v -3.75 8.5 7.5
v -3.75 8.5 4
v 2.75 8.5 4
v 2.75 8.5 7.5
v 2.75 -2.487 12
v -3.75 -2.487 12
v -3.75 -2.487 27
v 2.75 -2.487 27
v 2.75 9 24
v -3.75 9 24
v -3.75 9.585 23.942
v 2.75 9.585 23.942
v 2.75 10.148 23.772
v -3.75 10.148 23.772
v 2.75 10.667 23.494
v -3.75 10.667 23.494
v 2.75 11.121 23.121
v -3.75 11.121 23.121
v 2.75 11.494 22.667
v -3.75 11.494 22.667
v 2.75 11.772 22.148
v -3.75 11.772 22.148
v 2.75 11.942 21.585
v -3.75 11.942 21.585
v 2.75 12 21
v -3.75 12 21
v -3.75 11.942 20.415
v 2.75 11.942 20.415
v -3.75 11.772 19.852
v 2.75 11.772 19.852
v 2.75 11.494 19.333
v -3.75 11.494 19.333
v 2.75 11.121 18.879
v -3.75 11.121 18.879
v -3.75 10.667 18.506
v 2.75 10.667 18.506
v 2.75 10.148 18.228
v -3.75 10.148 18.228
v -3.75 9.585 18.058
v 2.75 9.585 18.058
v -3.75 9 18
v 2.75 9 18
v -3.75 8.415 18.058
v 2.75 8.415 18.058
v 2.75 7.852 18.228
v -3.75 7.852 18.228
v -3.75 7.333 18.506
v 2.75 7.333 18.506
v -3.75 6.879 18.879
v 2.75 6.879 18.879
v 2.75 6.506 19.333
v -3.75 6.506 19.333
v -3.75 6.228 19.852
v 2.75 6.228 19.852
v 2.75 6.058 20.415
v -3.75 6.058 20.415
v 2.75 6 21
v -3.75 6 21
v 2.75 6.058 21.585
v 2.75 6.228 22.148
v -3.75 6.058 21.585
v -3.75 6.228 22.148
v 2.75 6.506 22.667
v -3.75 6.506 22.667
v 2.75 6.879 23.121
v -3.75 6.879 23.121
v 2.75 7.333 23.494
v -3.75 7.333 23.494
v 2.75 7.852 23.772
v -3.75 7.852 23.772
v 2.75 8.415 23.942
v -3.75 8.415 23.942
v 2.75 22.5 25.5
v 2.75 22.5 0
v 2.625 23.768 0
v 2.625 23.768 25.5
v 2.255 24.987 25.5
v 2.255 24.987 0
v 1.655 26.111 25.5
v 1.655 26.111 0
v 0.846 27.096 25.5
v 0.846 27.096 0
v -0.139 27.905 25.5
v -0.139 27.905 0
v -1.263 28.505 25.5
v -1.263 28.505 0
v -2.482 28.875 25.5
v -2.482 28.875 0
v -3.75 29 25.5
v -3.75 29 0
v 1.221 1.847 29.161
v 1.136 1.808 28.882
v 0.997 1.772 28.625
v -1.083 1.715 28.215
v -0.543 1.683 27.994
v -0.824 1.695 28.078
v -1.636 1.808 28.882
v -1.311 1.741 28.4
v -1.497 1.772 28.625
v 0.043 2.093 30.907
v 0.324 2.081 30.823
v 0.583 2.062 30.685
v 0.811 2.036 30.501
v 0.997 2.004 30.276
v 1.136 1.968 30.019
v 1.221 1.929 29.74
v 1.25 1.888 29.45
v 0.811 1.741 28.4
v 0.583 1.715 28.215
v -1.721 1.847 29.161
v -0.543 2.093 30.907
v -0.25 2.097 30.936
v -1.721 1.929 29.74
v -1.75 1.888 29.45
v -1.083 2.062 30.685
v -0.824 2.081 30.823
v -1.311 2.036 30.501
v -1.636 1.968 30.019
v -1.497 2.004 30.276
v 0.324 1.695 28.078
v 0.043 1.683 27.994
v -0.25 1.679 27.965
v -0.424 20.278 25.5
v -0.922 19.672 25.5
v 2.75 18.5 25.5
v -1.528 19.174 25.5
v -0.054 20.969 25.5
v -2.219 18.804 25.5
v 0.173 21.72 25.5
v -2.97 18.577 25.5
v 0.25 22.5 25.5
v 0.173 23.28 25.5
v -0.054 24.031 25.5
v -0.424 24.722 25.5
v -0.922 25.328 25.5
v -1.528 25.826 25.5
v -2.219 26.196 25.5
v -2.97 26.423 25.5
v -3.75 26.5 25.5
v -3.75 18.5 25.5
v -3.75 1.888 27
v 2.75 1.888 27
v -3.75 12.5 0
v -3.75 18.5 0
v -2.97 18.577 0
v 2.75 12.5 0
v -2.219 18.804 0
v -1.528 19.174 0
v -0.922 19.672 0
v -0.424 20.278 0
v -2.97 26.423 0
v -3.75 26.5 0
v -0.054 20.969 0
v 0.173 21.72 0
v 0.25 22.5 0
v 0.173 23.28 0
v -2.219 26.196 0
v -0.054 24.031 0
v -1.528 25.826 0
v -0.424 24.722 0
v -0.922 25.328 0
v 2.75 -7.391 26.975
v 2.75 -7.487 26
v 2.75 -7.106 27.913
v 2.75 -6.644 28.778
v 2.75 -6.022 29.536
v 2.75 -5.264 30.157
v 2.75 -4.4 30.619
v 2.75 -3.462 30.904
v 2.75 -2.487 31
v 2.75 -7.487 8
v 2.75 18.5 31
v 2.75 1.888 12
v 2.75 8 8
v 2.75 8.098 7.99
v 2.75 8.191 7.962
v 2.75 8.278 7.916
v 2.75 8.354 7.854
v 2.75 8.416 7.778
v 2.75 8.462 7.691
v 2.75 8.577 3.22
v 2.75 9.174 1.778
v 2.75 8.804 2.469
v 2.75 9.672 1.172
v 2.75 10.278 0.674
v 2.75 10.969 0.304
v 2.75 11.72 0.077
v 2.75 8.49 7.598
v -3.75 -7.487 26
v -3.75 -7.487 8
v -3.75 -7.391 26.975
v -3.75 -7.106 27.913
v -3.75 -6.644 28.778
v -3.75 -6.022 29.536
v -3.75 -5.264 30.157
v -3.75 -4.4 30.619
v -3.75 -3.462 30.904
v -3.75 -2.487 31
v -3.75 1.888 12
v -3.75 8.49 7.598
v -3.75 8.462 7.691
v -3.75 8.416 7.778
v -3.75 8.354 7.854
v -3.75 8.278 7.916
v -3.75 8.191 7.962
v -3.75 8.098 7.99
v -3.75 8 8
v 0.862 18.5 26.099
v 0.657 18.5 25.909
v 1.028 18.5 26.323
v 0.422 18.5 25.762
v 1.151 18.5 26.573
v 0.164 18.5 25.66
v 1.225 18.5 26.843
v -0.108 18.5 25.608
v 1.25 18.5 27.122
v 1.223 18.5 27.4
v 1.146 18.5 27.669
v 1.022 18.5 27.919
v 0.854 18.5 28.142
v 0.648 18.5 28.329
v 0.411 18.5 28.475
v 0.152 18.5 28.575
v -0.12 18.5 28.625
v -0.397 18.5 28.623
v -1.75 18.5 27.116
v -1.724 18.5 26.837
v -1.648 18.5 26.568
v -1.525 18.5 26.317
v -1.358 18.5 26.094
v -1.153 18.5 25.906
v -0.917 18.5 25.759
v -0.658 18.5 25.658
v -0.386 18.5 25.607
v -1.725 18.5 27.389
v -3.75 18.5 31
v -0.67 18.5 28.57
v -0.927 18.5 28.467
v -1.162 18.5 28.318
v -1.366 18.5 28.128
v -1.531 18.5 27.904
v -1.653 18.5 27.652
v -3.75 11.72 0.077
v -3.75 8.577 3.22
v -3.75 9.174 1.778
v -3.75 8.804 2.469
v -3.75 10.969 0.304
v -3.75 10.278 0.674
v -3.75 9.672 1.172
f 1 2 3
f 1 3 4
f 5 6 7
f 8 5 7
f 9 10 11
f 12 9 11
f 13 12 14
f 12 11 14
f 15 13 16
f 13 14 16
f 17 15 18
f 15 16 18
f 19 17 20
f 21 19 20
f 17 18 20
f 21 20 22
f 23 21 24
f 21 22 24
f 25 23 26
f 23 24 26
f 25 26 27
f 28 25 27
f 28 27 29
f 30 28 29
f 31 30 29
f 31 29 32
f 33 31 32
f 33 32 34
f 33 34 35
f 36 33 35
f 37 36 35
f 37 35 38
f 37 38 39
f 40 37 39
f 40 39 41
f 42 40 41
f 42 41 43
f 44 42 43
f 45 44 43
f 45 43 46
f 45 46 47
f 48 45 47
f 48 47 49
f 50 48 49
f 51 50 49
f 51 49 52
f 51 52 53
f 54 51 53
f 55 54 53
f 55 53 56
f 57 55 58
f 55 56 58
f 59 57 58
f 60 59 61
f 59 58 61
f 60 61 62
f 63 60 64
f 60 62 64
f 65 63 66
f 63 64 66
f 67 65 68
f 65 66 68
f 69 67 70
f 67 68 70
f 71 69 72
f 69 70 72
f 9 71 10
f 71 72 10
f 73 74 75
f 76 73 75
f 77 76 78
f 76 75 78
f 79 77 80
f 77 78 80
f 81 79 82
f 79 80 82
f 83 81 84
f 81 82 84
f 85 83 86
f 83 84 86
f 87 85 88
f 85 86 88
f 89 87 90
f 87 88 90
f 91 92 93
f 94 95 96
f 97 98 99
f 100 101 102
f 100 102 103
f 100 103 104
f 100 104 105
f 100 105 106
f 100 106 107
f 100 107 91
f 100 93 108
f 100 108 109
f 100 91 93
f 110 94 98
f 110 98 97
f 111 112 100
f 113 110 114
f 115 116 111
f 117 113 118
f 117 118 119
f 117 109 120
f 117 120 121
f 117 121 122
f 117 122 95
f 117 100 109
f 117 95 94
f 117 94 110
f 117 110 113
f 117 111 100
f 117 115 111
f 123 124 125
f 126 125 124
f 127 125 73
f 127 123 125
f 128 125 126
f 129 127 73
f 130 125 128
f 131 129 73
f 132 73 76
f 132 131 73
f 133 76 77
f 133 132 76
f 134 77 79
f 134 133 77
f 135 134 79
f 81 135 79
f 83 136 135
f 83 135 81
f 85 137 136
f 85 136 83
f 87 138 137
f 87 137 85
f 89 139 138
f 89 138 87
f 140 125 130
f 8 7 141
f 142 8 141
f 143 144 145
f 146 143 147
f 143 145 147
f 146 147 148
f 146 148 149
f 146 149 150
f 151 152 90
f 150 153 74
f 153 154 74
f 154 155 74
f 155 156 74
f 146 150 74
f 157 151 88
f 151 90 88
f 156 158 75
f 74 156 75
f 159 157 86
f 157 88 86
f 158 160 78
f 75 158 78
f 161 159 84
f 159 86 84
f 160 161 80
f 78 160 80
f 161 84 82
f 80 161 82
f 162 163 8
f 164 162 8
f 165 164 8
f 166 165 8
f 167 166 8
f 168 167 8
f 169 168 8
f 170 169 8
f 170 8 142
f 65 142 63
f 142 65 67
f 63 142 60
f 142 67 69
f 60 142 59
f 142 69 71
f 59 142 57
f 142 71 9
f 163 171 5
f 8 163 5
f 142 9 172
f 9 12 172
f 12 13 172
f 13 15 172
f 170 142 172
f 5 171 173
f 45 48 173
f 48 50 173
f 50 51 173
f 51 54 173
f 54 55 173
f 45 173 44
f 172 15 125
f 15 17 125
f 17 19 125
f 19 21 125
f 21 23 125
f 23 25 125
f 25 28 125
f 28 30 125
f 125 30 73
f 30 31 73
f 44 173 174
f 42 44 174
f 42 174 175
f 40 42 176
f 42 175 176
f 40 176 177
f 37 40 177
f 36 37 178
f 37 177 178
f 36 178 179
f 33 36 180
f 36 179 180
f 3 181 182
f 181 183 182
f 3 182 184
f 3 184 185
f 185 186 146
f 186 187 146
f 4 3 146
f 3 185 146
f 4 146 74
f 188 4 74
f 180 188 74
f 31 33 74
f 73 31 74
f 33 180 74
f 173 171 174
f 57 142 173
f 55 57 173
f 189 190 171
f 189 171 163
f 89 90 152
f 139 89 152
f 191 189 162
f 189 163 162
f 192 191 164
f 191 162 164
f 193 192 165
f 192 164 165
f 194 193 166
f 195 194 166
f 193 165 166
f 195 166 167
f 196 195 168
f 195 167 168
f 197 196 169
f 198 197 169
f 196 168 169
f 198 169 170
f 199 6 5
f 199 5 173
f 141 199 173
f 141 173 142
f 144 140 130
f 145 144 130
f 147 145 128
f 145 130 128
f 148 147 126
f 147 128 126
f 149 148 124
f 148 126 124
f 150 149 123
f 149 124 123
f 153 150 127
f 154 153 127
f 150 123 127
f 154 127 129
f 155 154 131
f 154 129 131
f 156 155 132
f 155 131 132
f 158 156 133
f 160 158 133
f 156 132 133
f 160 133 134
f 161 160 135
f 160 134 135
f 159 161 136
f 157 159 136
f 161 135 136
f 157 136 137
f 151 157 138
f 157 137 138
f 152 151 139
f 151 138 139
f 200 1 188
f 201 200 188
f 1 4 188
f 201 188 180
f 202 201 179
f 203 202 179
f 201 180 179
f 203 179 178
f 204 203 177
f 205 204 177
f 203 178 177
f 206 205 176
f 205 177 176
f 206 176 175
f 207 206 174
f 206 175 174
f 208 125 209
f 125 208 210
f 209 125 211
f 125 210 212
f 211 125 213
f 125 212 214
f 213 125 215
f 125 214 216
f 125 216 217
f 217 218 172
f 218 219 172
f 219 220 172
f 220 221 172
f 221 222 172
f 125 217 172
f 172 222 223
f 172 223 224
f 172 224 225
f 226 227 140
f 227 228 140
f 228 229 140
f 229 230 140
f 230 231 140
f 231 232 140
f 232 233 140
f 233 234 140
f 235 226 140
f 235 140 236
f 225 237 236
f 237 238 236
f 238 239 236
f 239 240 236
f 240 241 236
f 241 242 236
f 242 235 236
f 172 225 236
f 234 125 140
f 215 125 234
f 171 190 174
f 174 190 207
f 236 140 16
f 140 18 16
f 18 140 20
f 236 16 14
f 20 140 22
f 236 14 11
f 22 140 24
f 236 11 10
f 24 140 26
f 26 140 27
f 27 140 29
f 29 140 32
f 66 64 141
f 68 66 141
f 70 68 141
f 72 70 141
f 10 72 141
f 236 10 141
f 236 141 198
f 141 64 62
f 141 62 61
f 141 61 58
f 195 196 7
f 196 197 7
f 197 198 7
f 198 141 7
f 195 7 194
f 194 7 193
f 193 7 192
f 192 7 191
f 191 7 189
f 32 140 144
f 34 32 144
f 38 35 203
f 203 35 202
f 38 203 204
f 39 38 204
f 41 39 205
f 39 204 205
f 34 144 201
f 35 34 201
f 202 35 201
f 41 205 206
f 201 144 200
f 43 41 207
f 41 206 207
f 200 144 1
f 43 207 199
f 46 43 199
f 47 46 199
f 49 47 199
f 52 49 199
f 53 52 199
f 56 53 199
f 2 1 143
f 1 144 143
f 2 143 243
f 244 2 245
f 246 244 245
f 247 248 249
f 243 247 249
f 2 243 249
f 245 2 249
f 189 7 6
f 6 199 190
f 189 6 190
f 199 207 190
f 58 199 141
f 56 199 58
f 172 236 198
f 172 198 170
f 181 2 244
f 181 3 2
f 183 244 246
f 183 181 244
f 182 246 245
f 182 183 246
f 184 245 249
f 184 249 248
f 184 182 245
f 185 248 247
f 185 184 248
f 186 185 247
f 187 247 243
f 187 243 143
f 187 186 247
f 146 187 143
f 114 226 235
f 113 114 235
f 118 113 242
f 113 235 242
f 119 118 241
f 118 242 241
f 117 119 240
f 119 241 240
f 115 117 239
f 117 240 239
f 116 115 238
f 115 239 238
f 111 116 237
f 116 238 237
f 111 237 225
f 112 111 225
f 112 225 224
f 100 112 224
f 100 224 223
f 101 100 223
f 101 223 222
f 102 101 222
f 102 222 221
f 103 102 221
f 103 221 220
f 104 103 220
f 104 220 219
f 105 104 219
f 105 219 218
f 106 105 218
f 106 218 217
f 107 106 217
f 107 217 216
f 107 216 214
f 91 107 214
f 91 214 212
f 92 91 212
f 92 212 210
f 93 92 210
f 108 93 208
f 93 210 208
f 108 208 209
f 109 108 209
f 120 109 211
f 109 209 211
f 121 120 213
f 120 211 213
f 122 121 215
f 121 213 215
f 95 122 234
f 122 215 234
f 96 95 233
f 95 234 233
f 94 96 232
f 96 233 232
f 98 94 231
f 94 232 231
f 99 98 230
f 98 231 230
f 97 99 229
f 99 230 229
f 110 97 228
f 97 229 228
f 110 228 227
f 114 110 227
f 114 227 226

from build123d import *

# Parameters (mm, degrees)
BOSS_EXTRUDE1_DEPTH = 31
SKETCH2_W           = 5.5
SKETCH2_H           = 10.5
CUT_EXTRUDE1_DEPTH  = 7.5
SKETCH3_R           = 3
CUT_EXTRUDE2_DEPTH  = 7.5
CUT_EXTRUDE5_REACH  = 8.5
SKETCH6_W           = 8
SKETCH6_H           = 13
FILLET1_R           = 0.5
FILLET2_R           = 4
CUT_EXTRUDE7_REACH  = 27.5
SKETCH9_R           = 1.5
CUT_EXTRUDE8_DEPTH  = 17
CUT_EXTRUDE9_DEPTH  = 10
FILLET3_R           = 5
SKETCH11_W          = 15
SKETCH11_H          = 4.374689329
CUT_EXTRUDE10_DEPTH = 7.5


with BuildPart() as part:
    # Sketch1 → Boss-Extrude1 (new body)
    with BuildSketch(Plane.XY):
        with BuildLine():
            Line((-3.75, 29), (-3.75, 22.5))
            Line((-3.75, 22.5), (-3.75, -22.5))
            Line((-3.75, -22.5), (2.75, -22.5))
            Line((2.75, -22.5), (2.75, 22.5))
            ThreePointArc((2.75, 22.5), (0.846194078, 27.096194078), (-3.75, 29))
        make_face()
    extrude(amount=BOSS_EXTRUDE1_DEPTH)

    # Sketch2 → Cut-Extrude1 (cut, through all)
    with BuildSketch(Plane.ZY.offset(3.75)):
        with Locations((28.25, 23.75)):
            Rectangle(SKETCH2_W, SKETCH2_H)
    extrude(amount=-CUT_EXTRUDE1_DEPTH, mode=Mode.SUBTRACT)

    # Sketch3 → Cut-Extrude2 (cut, through all)
    with BuildSketch(Plane.ZY.offset(3.75)):
        with Locations((21, 9)):
            Circle(SKETCH3_R)
        with Locations((21, -12.5)):
            Circle(SKETCH3_R)
    extrude(amount=-CUT_EXTRUDE2_DEPTH, mode=Mode.SUBTRACT)

    # Sketch6 → Cut-Extrude5 (cut, up to next)
    with BuildSketch(Plane.ZY.offset(3.75), mode=Mode.PRIVATE) as cut_extrude5_sk1:
        with Locations((4, 2)):
            Rectangle(SKETCH6_W, SKETCH6_H)
    cut_extrude5_tool1 = extrude(cut_extrude5_sk1.sketch, amount=-CUT_EXTRUDE5_REACH, mode=Mode.PRIVATE) & part.part
    add(cut_extrude5_tool1.solids().sort_by_distance((-3.75, 2, 4))[0], mode=Mode.SUBTRACT)

    # Fillet1
    fillet1_edges = [part.edges().sort_by_distance(p)[0] for p in [
        (-0.5, 8.5, 8),
        (-0.5, -4.5, 8),
    ]]
    fillet(fillet1_edges, radius=FILLET1_R)

    # Fillet2
    fillet2_edges = [part.edges().sort_by_distance(p)[0] for p in [
        (-0.5, -4.5, 0),
        (-0.5, 8.5, 0),
    ]]
    fillet(fillet2_edges, radius=FILLET2_R)

    # Sketch8 → Cut-Extrude7 (cut, up to next)
    with BuildSketch(Plane.XY.offset(25.5), mode=Mode.PRIVATE) as cut_extrude7_sk1:
        with BuildLine():
            Line((-3.75, 26.5), (-3.75, 18.5))
            ThreePointArc((-3.75, 18.5), (0.25, 22.5), (-3.75, 26.5))
        make_face()
    cut_extrude7_tool1 = extrude(cut_extrude7_sk1.sketch, amount=-CUT_EXTRUDE7_REACH, mode=Mode.PRIVATE) & part.part
    add(cut_extrude7_tool1.solids().sort_by_distance((-2.052347, 22.5, 25.5))[0], mode=Mode.SUBTRACT)

    # Sketch9 → Cut-Extrude8 (cut)
    with BuildSketch(Plane(origin=(0, 14.627294401, -2.055732165), x_dir=(-1, 0, 0), z_dir=(0, 0.990268069, -0.139173101))):
        with Locations((0.25, 29.426538121)):
            Circle(SKETCH9_R)
    extrude(amount=-CUT_EXTRUDE8_DEPTH, mode=Mode.SUBTRACT)

    # Sketch10 → Cut-Extrude9 (cut)
    with BuildSketch(Plane.ZY.offset(3.75)):
        Polygon((8, -7.48664609), (35.202378245, -7.48664609), (35.202378245, -24.00834186), (-1.764970627, -24.00834186), (-1.764970627, -2.884142505), (8, -2.884142505), align=None)
    extrude(amount=-CUT_EXTRUDE9_DEPTH, mode=Mode.SUBTRACT)

    # Fillet3
    fillet3_edges = [part.edges().sort_by_distance(p)[0] for p in [
        (-0.5, -7.48664609, 31),
    ]]
    fillet(fillet3_edges, radius=FILLET3_R)

    # Sketch11 → Cut-Extrude10 (cut, through all)
    with BuildSketch(Plane.ZY.offset(3.75)):
        with Locations((19.5, -0.299301426)):
            Rectangle(SKETCH11_W, SKETCH11_H)
    extrude(amount=-CUT_EXTRUDE10_DEPTH, mode=Mode.SUBTRACT)


solid = part.part
